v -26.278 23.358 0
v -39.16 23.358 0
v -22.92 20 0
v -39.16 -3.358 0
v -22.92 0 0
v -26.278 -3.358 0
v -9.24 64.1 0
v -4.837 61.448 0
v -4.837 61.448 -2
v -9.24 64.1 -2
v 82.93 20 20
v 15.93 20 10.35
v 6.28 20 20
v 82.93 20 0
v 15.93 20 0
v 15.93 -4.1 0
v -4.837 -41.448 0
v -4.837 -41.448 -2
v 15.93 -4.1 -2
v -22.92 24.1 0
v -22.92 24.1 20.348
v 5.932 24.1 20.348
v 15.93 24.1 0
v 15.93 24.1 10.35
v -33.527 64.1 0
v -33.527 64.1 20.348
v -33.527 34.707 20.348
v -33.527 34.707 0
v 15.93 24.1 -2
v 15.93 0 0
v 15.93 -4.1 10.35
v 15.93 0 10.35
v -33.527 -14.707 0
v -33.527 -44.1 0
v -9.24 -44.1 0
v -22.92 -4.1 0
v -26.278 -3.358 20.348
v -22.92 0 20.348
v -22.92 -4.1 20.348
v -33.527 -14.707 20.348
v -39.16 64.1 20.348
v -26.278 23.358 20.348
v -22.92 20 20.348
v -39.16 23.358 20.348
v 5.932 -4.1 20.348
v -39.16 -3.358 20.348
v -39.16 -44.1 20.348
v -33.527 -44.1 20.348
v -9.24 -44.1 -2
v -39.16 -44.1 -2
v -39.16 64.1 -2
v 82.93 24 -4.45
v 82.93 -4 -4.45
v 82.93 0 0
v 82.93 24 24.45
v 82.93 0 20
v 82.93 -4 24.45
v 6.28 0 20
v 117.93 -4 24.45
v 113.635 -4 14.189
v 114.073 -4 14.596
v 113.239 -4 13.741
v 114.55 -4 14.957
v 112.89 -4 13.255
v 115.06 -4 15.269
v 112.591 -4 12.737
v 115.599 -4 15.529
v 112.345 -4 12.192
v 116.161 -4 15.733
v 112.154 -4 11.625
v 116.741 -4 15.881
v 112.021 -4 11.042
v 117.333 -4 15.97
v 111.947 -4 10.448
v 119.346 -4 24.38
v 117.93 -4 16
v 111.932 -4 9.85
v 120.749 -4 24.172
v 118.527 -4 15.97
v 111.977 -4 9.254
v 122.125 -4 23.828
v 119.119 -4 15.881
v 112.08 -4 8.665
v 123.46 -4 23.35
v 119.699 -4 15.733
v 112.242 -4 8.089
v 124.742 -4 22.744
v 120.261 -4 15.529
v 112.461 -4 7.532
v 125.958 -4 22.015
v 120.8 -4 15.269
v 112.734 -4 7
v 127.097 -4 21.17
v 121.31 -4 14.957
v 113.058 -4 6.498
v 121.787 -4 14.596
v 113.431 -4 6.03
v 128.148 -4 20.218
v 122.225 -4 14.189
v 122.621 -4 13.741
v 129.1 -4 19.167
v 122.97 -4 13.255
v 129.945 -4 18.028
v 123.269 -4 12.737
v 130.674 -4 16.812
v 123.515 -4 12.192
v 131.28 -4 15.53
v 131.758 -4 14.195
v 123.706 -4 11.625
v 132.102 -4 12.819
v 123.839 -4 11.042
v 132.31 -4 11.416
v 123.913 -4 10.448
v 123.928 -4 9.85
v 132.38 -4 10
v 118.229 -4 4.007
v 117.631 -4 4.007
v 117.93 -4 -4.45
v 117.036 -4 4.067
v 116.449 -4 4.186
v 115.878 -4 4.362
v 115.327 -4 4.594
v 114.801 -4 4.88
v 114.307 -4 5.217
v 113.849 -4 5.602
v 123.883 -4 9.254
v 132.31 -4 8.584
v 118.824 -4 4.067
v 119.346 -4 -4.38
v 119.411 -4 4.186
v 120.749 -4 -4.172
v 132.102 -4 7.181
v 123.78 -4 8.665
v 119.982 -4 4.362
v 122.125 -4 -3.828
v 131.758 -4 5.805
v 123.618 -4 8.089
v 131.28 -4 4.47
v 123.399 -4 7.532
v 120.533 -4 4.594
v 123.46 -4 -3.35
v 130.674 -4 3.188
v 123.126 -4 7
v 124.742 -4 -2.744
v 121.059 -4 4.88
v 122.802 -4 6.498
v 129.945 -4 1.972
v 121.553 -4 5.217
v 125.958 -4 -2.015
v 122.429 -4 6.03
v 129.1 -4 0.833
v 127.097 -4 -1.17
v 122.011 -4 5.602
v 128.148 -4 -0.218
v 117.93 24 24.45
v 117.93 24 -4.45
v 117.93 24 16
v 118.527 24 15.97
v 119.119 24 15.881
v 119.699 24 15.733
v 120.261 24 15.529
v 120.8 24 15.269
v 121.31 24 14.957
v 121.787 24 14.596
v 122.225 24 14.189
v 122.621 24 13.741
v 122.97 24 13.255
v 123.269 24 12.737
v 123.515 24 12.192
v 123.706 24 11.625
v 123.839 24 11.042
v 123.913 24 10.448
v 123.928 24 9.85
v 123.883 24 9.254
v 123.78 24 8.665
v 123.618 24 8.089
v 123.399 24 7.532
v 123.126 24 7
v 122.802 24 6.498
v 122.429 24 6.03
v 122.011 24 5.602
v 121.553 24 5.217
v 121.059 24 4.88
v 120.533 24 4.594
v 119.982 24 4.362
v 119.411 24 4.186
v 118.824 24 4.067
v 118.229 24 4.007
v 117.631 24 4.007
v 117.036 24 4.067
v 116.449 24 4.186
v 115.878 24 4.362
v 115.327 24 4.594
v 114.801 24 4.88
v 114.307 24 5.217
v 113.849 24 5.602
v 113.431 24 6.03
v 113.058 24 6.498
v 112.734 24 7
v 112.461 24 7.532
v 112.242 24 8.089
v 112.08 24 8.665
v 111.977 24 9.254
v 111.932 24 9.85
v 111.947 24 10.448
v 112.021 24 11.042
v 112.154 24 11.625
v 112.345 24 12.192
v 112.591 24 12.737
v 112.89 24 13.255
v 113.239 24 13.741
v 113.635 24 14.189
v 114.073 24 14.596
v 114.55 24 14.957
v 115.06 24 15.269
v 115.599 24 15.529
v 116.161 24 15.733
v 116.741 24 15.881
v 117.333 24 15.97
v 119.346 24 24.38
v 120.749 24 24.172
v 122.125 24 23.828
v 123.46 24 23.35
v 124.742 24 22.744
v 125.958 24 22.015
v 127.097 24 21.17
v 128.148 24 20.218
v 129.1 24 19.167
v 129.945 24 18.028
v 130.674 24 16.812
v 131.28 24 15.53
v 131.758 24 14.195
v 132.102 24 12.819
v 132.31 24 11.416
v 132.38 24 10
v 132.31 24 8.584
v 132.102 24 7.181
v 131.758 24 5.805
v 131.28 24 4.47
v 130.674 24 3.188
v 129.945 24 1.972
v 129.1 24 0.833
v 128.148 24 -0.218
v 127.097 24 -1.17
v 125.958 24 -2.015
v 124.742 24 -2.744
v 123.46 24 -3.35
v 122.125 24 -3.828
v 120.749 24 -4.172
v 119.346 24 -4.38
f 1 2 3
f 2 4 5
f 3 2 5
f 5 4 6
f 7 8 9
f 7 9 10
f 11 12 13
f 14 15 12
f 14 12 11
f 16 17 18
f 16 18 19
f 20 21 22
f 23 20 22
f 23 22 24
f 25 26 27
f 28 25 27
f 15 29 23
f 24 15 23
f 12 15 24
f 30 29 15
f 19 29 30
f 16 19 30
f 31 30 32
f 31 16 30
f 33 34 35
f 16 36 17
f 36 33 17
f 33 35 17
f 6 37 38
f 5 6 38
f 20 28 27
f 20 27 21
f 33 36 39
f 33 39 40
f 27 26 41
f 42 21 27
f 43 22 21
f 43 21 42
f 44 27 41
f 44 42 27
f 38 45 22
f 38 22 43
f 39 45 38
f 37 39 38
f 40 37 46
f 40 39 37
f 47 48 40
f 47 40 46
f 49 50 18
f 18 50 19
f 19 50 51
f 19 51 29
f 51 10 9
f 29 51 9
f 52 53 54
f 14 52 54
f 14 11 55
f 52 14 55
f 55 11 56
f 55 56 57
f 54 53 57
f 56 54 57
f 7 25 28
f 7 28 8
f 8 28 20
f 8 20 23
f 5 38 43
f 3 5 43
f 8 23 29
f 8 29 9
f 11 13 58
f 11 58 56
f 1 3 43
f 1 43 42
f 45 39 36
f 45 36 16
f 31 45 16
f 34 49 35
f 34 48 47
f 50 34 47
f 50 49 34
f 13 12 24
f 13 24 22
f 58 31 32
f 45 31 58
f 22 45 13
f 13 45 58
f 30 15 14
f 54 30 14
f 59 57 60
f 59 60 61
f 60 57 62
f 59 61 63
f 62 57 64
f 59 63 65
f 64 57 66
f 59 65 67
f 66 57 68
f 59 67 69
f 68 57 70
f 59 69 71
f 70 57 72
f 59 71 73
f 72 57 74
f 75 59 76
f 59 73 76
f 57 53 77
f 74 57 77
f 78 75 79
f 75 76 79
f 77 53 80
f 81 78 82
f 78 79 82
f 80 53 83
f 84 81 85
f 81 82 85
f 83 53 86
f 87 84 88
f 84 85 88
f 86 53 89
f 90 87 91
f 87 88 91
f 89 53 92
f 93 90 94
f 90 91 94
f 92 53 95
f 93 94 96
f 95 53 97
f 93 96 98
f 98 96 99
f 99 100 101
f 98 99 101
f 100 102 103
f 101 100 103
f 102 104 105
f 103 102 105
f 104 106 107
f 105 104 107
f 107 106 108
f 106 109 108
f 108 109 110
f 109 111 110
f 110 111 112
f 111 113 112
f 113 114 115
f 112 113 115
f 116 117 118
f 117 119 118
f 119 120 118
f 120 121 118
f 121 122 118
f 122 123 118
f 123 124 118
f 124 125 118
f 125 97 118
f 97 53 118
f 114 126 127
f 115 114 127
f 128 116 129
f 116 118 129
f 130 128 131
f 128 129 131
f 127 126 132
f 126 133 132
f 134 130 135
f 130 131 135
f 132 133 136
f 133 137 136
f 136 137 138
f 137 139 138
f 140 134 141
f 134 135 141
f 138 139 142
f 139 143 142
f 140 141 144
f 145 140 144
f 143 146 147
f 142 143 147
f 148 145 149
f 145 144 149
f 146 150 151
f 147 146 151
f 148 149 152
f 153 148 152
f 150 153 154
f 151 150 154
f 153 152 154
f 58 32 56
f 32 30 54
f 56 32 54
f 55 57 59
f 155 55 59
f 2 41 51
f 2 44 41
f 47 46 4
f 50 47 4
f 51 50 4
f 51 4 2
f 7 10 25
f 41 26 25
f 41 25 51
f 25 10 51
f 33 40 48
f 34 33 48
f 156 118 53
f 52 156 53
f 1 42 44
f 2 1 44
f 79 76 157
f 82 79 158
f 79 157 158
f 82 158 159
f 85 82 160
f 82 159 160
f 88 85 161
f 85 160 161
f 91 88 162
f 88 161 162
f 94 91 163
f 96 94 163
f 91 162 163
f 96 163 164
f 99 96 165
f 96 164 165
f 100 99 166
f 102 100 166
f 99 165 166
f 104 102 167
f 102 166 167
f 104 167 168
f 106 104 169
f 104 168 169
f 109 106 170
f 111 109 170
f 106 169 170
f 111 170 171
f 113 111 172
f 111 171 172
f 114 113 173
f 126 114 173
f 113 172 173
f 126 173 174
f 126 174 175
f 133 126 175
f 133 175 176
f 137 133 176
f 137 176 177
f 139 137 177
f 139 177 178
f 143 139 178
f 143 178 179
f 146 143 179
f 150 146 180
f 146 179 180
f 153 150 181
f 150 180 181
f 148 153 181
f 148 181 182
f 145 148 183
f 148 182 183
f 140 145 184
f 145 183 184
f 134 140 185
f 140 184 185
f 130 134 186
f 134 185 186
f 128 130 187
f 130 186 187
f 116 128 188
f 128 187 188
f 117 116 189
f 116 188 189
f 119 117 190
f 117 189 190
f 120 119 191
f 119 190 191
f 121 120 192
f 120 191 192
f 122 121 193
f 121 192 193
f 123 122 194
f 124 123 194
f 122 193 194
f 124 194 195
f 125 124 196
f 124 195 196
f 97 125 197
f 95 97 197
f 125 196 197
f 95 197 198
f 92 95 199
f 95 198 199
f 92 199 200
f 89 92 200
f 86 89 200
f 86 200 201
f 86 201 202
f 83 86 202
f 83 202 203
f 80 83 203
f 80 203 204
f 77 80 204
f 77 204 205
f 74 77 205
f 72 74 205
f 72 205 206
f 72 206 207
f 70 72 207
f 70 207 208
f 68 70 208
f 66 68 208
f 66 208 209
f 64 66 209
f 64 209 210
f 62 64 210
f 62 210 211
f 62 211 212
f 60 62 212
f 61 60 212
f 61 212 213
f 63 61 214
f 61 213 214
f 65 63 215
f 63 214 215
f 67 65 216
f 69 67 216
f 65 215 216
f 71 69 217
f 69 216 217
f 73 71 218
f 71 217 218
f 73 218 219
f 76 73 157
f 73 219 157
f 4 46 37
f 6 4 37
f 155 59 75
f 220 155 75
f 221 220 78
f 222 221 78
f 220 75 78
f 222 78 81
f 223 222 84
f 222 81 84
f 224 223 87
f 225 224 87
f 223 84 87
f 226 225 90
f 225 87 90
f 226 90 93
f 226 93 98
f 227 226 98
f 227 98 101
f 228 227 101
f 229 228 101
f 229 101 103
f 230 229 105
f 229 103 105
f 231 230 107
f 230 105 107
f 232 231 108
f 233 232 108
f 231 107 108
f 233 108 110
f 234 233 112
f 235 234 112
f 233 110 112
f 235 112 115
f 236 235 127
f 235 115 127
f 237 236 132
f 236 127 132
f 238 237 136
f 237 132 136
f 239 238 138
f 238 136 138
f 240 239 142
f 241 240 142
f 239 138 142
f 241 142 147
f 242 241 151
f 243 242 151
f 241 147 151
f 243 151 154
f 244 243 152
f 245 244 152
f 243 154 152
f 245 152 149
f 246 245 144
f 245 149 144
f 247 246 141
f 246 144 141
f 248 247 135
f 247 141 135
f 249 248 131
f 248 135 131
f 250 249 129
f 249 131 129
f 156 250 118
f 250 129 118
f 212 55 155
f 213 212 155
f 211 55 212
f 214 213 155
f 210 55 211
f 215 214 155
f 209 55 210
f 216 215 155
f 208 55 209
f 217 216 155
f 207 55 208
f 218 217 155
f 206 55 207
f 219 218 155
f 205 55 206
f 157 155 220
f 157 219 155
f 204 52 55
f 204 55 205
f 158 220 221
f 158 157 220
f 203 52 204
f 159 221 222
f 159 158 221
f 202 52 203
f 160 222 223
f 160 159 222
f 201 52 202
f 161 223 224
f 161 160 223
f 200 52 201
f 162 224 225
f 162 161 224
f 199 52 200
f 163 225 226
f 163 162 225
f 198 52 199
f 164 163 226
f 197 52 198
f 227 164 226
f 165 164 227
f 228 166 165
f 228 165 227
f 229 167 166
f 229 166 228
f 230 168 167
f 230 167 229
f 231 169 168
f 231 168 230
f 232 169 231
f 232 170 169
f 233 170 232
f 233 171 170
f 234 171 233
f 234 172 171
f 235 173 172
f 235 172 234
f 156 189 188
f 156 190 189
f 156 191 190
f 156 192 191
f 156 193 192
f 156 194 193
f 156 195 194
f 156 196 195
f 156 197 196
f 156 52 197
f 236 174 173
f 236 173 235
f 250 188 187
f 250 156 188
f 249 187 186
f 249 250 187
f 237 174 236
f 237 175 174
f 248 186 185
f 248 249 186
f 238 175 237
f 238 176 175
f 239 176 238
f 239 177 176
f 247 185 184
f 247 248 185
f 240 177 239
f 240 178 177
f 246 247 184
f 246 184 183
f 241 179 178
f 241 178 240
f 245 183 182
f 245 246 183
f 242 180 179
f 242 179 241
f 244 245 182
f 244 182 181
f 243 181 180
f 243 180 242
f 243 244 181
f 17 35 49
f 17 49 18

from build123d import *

# Parameters (mm, degrees)
BOSS_EXTRUDE3_START = -4
BOSS_EXTRUDE3_DEPTH = 28
SKETCH3_R           = 6
CUT_EXTRUDE1_DEPTH  = 28
BOSS_EXTRUDE4_START = 10
SKETCH5_W           = 77
SKETCH5_H           = 20
BOSS_EXTRUDE4_DEPTH = 10
BOSS_EXTRUDE5_DEPTH = 2
BOSS_EXTRUDE6_DEPTH = 54.1
CUT_EXTRUDE5_REACH  = 151.158
SKETCH9_W           = 9.998489886
SKETCH9_H           = 40


with BuildPart() as part:
    # Sketch1 → Boss-Extrude3 (new body)
    with BuildSketch(Plane(origin=(0, 0, 0), x_dir=(1, 0, 0), z_dir=(0, 1, 0)).offset(BOSS_EXTRUDE3_START)):
        with BuildLine():
            Line((117.93, 4.45), (82.93, 4.45))
            Line((82.93, 4.45), (82.93, -24.45))
            Line((82.93, -24.45), (117.93, -24.45))
            ThreePointArc((117.93, -24.45), (132.38, -10), (117.93, 4.45))
        make_face()
    extrude(amount=BOSS_EXTRUDE3_DEPTH)

    # Sketch3 → Cut-Extrude1 (cut)
    with BuildSketch(Plane(origin=(0, 24, 0), x_dir=(1, 0, 0), z_dir=(0, 1, 0))):
        with Locations(Location((117.93, -10, 0), (0, 0, 270))):
            Circle(SKETCH3_R)
    extrude(amount=-CUT_EXTRUDE1_DEPTH, mode=Mode.SUBTRACT)

    # Sketch5 → Boss-Extrude4 (add, symmetric)
    with BuildSketch(Plane(origin=(0, 0, 0), x_dir=(1, 0, 0), z_dir=(0, 1, 0)).offset(BOSS_EXTRUDE4_START)):
        with Locations((44.43, -10)):
            Rectangle(SKETCH5_W, SKETCH5_H)
    extrude(amount=BOSS_EXTRUDE4_DEPTH, both=True)

    # Sketch6 → Boss-Extrude5 (add)
    with BuildSketch(Plane.XY):
        Polygon((-39.16, 64.1), (-39.16, -44.1), (-9.24, -44.1), (-4.836934731, -41.448091963), (15.93, -4.1), (15.93, 24.1), (-4.836934731, 61.448091963), (-9.24, 64.1), align=None)
    extrude(amount=-BOSS_EXTRUDE5_DEPTH)

    # Sketch7 → Boss-Extrude6 (add, symmetric)
    with BuildSketch(Plane(origin=(0, 10, 0), x_dir=(-1, 0, 0), z_dir=(0, -1, 0))):
        Polygon((-15.93, 0), (-15.93, -10.35), (-5.931510114, -20.348489886), (26.278489886, -20.348489886), (39.16, -20.348489886), (39.16, 0), align=None)
    extrude(amount=BOSS_EXTRUDE6_DEPTH, both=True)

    # Cut-Extrude5: up to this face of the body (flat: up to its plane)
    cut_extrude5_end = Plane(part.part.faces().sort_by_distance((8.383659054, -30.874400728, 0))[0])
    # Sketch9 → Cut-Extrude5 (cut, up to the picked face)
    with BuildSketch(Plane.XY.offset(20.348489886), mode=Mode.PRIVATE) as cut_extrude5_sk1:
        with Locations((10.930755057, -24.1)):
            Rectangle(SKETCH9_W, SKETCH9_H)
    cut_extrude5_tool1 = split(extrude(cut_extrude5_sk1.sketch, amount=-CUT_EXTRUDE5_REACH, mode=Mode.PRIVATE), bisect_by=cut_extrude5_end, keep=Keep.BOTH, mode=Mode.PRIVATE)
    # Sketch9 → Cut-Extrude5 (cut, up to the picked face)
    with BuildSketch(Plane.XY.offset(20.348489886), mode=Mode.PRIVATE) as cut_extrude5_sk2:
        Polygon((5.931510114, -44.1), (5.931510114, -4.1), (-22.92, -4.1), (-33.526601718, -14.706601718), (-33.526601718, -44.1), align=None)
    cut_extrude5_tool2 = split(extrude(cut_extrude5_sk2.sketch, amount=-CUT_EXTRUDE5_REACH, mode=Mode.PRIVATE), bisect_by=cut_extrude5_end, keep=Keep.BOTH, mode=Mode.PRIVATE)
    # Sketch9 → Cut-Extrude5 (cut, up to the picked face)
    with BuildSketch(Plane.XY.offset(20.348489886), mode=Mode.PRIVATE) as cut_extrude5_sk3:
        with Locations((10.930755057, 44.1)):
            Rectangle(SKETCH9_W, SKETCH9_H)
    cut_extrude5_tool3 = split(extrude(cut_extrude5_sk3.sketch, amount=-CUT_EXTRUDE5_REACH, mode=Mode.PRIVATE), bisect_by=cut_extrude5_end, keep=Keep.BOTH, mode=Mode.PRIVATE)
    # Sketch9 → Cut-Extrude5 (cut, up to the picked face)
    with BuildSketch(Plane.XY.offset(20.348489886), mode=Mode.PRIVATE) as cut_extrude5_sk4:
        Polygon((-22.92, 24.1), (5.931510114, 24.1), (5.931510114, 64.1), (-33.526601718, 64.1), (-33.526601718, 34.706601718), align=None)
    cut_extrude5_tool4 = split(extrude(cut_extrude5_sk4.sketch, amount=-CUT_EXTRUDE5_REACH, mode=Mode.PRIVATE), bisect_by=cut_extrude5_end, keep=Keep.BOTH, mode=Mode.PRIVATE)
    # Sketch9 → Cut-Extrude5 (cut, up to the picked face)
    with BuildSketch(Plane.XY.offset(20.348489886), mode=Mode.PRIVATE) as cut_extrude5_sk5:
        Polygon((-22.92, 0), (-22.92, 20), (-26.278489886, 23.358489886), (-39.16, 23.358489886), (-39.16, -3.358489886), (-26.278489886, -3.358489886), align=None)
    cut_extrude5_tool5 = split(extrude(cut_extrude5_sk5.sketch, amount=-CUT_EXTRUDE5_REACH, mode=Mode.PRIVATE), bisect_by=cut_extrude5_end, keep=Keep.BOTH, mode=Mode.PRIVATE)
    add(cut_extrude5_tool1.solids().sort_by(Axis((10.930755, -24.1, 20.34849), (0, 0, -1)))[0], mode=Mode.SUBTRACT)
    add(cut_extrude5_tool2.solids().sort_by(Axis((-13.199096, -24.708463, 20.34849), (0, 0, -1)))[0], mode=Mode.SUBTRACT)
    add(cut_extrude5_tool3.solids().sort_by(Axis((10.930755, 44.1, 20.34849), (0, 0, -1)))[0], mode=Mode.SUBTRACT)
    add(cut_extrude5_tool4.solids().sort_by(Axis((-13.199096, 44.708463, 20.34849), (0, 0, -1)))[0], mode=Mode.SUBTRACT)
    add(cut_extrude5_tool5.solids().sort_by(Axis((-31.226846, 10, 20.34849), (0, 0, -1)))[0], mode=Mode.SUBTRACT)


solid = part.part
